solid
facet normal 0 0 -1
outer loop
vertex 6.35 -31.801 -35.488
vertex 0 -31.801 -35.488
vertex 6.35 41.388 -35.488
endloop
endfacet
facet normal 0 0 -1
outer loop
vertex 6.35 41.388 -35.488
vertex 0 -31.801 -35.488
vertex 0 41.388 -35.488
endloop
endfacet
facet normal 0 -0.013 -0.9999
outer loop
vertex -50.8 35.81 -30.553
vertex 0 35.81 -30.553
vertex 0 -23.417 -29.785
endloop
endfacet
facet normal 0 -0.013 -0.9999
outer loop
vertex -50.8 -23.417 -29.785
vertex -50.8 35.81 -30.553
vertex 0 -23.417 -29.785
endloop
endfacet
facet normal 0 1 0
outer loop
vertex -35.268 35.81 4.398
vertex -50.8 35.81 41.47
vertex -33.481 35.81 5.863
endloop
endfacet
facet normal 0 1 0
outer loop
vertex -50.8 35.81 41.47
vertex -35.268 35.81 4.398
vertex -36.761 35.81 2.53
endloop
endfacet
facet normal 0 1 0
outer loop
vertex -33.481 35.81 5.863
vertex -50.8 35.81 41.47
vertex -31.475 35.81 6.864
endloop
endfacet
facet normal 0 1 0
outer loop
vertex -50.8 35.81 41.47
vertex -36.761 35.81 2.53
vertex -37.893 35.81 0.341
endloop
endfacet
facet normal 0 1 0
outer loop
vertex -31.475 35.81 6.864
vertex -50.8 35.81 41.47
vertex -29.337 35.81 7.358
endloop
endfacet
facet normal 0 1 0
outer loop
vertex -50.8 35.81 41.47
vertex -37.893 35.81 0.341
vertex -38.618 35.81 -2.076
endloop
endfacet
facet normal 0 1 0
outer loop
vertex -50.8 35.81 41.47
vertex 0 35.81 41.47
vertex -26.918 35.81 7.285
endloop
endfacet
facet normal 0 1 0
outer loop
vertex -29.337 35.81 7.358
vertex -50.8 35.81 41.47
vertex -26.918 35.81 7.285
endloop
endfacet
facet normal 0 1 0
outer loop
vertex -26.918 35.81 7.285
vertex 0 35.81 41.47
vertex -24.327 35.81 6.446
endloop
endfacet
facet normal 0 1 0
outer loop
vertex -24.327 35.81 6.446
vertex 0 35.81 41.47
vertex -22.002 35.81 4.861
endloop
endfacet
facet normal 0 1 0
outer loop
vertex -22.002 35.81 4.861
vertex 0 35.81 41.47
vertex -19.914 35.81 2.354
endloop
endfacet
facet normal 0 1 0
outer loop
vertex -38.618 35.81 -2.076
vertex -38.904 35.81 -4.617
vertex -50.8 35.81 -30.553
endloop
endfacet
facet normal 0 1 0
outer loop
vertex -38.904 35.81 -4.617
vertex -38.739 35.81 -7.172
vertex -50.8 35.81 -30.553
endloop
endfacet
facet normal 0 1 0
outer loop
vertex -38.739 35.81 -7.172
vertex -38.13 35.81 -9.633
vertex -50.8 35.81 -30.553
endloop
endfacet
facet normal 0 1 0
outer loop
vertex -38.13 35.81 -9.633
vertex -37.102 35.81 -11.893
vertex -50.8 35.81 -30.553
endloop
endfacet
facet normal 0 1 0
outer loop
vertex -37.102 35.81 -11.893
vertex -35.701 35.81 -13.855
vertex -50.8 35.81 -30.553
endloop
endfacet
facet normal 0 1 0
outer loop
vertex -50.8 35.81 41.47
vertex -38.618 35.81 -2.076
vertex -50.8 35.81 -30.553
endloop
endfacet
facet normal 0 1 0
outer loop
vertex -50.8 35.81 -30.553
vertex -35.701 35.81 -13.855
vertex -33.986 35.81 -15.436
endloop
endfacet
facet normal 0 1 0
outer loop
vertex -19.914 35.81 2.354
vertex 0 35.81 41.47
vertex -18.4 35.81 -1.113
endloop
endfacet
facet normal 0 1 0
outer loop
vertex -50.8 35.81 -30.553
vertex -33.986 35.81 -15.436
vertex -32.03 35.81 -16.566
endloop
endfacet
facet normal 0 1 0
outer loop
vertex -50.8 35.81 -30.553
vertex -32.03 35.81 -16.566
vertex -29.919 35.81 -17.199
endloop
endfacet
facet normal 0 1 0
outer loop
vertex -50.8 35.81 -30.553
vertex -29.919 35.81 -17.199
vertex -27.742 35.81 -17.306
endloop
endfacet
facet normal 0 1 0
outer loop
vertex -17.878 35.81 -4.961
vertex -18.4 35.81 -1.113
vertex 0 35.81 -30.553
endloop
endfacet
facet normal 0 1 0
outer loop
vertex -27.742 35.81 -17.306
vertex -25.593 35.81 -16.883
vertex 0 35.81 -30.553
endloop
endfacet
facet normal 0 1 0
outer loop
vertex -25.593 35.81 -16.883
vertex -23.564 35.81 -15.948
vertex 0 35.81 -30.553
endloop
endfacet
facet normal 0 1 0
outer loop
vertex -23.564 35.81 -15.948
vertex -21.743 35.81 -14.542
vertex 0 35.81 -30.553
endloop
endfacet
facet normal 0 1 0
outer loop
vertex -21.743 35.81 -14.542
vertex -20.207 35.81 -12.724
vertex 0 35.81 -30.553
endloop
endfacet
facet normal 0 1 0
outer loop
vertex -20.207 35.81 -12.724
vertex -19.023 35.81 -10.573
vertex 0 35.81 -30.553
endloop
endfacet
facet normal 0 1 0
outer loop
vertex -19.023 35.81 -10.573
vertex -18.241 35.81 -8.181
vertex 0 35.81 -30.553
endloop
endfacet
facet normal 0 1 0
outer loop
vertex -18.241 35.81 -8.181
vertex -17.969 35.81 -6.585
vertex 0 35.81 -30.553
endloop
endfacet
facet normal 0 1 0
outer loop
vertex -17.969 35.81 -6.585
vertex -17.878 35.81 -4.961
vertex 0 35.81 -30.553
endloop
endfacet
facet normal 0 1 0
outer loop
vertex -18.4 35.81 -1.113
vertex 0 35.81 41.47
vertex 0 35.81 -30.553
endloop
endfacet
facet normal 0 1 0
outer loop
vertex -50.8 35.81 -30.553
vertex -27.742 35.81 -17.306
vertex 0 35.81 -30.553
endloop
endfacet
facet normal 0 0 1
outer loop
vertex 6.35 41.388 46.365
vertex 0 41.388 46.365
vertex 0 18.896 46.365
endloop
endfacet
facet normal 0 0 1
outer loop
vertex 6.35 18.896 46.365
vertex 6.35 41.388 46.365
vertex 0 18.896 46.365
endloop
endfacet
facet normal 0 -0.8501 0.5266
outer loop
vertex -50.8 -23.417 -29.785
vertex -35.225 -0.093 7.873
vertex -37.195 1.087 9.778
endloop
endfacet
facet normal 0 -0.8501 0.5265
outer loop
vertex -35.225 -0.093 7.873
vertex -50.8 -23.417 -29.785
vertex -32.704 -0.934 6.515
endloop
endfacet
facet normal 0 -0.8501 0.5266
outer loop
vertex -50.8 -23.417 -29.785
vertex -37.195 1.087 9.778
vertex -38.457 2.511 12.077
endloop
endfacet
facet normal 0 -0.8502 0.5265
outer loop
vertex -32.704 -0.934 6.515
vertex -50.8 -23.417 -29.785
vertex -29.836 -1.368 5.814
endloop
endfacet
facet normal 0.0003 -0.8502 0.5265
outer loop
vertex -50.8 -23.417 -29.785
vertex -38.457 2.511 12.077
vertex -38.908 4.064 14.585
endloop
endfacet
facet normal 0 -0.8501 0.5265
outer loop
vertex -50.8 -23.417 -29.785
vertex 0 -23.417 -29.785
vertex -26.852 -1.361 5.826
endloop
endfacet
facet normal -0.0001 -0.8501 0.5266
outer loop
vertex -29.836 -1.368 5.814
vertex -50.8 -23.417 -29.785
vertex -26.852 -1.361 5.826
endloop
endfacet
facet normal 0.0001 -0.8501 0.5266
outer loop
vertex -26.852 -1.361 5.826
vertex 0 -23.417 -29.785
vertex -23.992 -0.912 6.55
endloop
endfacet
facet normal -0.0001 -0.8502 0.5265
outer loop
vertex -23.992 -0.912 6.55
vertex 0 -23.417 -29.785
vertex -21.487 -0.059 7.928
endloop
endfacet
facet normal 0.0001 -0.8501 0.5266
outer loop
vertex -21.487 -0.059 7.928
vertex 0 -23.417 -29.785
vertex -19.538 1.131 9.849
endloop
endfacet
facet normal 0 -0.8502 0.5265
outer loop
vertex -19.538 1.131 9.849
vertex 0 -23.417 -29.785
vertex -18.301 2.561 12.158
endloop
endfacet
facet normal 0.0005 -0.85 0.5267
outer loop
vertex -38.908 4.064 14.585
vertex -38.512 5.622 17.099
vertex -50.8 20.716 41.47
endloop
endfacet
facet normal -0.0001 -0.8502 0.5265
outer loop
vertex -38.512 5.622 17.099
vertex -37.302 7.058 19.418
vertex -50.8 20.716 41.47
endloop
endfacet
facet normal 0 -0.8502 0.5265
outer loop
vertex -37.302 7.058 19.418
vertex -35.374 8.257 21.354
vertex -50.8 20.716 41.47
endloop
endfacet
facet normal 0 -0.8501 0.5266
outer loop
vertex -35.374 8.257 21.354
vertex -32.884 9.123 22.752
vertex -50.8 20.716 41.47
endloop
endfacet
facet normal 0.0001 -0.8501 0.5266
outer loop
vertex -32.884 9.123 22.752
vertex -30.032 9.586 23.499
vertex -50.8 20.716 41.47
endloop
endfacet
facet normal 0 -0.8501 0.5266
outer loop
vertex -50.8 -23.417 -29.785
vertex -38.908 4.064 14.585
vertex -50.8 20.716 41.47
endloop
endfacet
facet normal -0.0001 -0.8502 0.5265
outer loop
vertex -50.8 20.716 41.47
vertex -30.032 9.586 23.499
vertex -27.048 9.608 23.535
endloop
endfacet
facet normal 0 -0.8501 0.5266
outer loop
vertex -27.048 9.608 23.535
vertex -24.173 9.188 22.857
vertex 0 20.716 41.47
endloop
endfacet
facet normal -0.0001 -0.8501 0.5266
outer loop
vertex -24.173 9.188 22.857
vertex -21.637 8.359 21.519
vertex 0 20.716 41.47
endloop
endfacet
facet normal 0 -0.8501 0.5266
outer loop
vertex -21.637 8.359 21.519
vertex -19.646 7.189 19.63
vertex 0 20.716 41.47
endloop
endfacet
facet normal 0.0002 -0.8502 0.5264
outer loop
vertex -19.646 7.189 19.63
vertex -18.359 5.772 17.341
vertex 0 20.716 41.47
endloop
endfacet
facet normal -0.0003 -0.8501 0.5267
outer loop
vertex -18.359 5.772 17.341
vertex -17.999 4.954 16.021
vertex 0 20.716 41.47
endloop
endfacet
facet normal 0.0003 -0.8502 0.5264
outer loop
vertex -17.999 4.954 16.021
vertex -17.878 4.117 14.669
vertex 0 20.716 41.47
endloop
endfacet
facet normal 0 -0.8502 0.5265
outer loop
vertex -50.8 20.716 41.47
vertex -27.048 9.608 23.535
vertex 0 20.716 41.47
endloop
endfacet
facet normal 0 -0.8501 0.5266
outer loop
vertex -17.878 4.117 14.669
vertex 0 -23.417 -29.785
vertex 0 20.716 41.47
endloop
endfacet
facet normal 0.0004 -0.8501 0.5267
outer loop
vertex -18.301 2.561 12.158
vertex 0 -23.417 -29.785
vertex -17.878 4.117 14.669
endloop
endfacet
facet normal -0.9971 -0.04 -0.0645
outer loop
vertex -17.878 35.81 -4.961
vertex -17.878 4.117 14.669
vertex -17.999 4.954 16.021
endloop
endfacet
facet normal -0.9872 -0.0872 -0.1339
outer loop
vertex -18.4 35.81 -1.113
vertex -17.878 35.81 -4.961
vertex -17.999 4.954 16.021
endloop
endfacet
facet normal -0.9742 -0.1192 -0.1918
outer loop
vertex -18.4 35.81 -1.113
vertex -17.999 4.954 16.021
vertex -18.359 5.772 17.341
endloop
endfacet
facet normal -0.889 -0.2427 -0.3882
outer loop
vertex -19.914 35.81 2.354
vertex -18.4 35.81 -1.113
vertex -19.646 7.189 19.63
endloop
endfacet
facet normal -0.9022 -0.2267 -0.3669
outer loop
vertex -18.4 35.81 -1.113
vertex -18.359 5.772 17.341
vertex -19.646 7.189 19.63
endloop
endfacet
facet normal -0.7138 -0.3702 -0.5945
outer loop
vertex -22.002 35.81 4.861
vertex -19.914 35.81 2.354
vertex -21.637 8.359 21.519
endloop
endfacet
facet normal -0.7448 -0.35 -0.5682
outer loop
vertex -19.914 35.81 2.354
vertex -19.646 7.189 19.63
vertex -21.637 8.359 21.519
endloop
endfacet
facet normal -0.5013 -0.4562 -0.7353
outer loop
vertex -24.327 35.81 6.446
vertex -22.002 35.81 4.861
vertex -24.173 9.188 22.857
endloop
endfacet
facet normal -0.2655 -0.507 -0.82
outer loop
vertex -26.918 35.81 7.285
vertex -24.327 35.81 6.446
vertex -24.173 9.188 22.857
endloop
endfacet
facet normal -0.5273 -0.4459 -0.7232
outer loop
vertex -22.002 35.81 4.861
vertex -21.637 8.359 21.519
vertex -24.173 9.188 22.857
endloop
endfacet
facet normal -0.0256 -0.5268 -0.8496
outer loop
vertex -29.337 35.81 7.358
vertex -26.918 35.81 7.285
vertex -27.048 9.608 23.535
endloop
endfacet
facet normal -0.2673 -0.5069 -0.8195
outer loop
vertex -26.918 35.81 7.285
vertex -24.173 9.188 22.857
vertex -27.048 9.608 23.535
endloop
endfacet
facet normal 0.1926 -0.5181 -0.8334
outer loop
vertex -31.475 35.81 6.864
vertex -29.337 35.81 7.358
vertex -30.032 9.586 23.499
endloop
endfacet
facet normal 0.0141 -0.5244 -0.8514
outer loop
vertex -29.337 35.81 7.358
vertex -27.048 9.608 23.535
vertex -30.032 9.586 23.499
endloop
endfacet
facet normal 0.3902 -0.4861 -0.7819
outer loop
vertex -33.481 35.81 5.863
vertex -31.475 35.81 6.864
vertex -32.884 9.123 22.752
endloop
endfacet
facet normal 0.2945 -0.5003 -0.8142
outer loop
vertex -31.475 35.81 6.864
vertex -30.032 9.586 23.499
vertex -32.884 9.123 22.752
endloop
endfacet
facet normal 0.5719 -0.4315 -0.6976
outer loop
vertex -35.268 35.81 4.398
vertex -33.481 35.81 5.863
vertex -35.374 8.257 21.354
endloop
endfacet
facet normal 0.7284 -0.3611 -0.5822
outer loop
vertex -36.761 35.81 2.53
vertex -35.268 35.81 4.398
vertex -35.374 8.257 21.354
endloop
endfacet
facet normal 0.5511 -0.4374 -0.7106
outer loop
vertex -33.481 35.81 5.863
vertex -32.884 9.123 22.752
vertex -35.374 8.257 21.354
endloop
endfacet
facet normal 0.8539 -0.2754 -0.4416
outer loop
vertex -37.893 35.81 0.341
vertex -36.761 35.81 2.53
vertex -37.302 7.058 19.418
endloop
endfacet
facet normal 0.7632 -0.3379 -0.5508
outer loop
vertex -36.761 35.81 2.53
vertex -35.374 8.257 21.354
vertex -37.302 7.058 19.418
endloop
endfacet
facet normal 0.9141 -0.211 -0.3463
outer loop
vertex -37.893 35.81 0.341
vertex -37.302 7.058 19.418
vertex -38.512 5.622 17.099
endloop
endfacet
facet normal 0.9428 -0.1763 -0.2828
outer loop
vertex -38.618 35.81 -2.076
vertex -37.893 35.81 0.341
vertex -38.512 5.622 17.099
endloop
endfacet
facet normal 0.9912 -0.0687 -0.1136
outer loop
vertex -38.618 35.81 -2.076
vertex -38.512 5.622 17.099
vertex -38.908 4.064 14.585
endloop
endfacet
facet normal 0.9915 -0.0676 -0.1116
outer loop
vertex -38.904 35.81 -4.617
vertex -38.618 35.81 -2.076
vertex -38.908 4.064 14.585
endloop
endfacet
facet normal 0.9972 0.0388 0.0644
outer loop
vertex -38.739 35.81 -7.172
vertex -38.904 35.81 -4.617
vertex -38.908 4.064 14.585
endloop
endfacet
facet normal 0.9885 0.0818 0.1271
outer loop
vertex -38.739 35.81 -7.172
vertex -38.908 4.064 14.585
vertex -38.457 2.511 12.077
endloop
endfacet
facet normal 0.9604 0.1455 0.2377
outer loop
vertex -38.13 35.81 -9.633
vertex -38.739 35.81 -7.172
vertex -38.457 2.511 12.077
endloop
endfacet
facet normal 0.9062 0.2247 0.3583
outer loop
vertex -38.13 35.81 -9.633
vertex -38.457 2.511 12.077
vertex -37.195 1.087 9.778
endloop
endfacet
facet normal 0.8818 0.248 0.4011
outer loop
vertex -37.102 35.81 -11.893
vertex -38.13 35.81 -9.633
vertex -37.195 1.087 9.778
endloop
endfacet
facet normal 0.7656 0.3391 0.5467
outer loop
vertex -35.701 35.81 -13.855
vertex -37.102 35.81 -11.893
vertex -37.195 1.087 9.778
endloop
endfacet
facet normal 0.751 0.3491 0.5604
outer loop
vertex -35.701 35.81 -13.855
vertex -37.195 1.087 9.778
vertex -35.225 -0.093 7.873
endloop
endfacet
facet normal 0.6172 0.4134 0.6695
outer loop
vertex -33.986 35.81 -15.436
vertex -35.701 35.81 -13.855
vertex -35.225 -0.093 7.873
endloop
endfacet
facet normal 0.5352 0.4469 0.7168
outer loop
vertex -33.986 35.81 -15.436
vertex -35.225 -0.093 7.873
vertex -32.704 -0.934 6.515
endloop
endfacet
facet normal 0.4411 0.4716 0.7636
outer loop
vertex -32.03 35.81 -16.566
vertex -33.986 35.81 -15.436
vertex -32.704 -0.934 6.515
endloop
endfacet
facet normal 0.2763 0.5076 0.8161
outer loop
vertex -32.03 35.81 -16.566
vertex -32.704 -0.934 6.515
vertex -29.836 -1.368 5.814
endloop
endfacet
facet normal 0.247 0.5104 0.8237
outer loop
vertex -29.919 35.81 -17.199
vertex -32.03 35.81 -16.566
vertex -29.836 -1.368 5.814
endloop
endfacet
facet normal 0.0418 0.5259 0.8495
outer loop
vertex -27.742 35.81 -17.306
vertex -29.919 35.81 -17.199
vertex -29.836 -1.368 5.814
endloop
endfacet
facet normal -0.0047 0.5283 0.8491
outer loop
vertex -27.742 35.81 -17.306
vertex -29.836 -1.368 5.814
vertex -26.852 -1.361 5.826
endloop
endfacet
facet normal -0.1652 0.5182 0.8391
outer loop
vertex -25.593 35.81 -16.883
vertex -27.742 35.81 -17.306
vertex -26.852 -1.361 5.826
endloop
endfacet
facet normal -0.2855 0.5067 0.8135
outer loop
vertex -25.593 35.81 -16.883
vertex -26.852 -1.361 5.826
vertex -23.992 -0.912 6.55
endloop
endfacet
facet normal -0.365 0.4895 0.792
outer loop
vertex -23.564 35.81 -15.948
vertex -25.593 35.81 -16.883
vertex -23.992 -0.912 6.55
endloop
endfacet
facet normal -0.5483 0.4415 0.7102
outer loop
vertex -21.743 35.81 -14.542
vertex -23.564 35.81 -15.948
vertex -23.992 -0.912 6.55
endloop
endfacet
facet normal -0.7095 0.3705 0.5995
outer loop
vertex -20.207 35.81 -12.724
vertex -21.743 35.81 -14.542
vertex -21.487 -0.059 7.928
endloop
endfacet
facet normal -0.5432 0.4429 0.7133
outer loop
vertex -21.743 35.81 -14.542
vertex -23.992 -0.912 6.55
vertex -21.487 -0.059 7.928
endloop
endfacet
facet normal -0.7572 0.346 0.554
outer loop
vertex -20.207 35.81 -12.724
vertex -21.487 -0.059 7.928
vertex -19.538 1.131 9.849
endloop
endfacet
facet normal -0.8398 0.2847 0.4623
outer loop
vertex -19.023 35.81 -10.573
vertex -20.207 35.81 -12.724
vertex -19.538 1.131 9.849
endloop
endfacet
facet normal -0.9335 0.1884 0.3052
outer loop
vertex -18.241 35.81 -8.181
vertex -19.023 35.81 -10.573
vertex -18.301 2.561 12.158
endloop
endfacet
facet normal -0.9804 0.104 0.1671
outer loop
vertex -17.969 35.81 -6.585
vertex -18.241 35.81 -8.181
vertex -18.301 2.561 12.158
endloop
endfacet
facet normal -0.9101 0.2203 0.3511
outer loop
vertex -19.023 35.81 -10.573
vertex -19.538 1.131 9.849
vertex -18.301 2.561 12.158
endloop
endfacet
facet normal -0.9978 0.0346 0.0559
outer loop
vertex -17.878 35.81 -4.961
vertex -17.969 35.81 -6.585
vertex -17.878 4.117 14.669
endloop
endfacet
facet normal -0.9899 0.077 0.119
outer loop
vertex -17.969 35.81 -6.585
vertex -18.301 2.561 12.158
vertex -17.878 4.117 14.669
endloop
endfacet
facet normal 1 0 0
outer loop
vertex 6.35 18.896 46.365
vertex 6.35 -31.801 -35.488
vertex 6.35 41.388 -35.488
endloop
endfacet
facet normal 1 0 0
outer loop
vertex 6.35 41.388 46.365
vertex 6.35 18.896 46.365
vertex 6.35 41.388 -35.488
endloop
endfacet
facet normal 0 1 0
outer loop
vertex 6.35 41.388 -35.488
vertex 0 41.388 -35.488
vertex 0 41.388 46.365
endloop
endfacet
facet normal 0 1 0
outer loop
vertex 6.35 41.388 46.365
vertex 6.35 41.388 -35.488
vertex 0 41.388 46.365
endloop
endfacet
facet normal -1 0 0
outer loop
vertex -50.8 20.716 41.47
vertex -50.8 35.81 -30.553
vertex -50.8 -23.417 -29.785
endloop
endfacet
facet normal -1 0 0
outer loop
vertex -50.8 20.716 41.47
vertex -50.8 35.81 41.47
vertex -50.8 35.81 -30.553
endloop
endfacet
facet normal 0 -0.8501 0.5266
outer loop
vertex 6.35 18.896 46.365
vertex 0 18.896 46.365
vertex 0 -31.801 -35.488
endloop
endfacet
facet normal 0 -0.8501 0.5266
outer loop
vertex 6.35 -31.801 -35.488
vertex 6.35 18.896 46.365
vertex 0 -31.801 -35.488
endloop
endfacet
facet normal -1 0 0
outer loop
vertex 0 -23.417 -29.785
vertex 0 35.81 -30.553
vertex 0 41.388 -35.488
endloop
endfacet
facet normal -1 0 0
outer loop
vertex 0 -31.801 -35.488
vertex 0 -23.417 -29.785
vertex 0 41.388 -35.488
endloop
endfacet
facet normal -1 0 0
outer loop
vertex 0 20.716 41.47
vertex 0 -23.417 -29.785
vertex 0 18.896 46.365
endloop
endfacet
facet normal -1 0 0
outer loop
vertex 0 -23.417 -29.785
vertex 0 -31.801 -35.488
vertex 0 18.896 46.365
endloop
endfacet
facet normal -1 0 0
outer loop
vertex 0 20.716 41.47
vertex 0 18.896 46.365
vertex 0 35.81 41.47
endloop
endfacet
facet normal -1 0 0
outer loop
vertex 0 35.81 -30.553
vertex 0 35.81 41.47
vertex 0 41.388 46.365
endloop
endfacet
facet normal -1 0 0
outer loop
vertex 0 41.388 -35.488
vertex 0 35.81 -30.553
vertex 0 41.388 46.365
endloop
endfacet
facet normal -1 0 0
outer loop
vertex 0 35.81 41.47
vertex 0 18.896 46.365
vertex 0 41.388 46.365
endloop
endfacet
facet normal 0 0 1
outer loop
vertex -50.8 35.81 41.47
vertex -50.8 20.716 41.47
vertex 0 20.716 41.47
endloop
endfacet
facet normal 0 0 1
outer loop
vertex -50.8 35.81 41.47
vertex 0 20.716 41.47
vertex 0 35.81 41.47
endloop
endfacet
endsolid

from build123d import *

# Parameters (mm, degrees)
F1_DEPTH = 6.35
F3_DEPTH = 50.8
F4_R     = 10.515242
F5_DEPTH = 83.82


with BuildPart() as f1:
    # F0 (on Right) → F1 (new body)
    with BuildSketch(Plane.YZ):
        Polygon((41.387662, -35.488307), (41.387662, 46.365242), (18.896371, 46.365242), (-31.801209, -35.488307), align=None)
    extrude(amount=F1_DEPTH)

    # F2 (on face) → F3 (join)
    with BuildSketch(Plane(origin=(0, 0, 0), x_dir=(0, -1, 0), z_dir=(-1, 0, 0))):
        Polygon((-35.810284, -30.553309), (23.417182, -29.785352), (-20.715904, 41.469525), (-35.810284, 41.469525), align=None)
    extrude(amount=F3_DEPTH)

    # F4 (on face) → F5 (cut)
    with BuildSketch(Plane(origin=(0, -3.591343, 2.224368), x_dir=(1, 0, 0), z_dir=(0, -0.850143, 0.526552))):
        with Locations((-28.393257, 14.638352)):
            Circle(F4_R)
    extrude(amount=-F5_DEPTH, mode=Mode.SUBTRACT)


solid = f1.part
